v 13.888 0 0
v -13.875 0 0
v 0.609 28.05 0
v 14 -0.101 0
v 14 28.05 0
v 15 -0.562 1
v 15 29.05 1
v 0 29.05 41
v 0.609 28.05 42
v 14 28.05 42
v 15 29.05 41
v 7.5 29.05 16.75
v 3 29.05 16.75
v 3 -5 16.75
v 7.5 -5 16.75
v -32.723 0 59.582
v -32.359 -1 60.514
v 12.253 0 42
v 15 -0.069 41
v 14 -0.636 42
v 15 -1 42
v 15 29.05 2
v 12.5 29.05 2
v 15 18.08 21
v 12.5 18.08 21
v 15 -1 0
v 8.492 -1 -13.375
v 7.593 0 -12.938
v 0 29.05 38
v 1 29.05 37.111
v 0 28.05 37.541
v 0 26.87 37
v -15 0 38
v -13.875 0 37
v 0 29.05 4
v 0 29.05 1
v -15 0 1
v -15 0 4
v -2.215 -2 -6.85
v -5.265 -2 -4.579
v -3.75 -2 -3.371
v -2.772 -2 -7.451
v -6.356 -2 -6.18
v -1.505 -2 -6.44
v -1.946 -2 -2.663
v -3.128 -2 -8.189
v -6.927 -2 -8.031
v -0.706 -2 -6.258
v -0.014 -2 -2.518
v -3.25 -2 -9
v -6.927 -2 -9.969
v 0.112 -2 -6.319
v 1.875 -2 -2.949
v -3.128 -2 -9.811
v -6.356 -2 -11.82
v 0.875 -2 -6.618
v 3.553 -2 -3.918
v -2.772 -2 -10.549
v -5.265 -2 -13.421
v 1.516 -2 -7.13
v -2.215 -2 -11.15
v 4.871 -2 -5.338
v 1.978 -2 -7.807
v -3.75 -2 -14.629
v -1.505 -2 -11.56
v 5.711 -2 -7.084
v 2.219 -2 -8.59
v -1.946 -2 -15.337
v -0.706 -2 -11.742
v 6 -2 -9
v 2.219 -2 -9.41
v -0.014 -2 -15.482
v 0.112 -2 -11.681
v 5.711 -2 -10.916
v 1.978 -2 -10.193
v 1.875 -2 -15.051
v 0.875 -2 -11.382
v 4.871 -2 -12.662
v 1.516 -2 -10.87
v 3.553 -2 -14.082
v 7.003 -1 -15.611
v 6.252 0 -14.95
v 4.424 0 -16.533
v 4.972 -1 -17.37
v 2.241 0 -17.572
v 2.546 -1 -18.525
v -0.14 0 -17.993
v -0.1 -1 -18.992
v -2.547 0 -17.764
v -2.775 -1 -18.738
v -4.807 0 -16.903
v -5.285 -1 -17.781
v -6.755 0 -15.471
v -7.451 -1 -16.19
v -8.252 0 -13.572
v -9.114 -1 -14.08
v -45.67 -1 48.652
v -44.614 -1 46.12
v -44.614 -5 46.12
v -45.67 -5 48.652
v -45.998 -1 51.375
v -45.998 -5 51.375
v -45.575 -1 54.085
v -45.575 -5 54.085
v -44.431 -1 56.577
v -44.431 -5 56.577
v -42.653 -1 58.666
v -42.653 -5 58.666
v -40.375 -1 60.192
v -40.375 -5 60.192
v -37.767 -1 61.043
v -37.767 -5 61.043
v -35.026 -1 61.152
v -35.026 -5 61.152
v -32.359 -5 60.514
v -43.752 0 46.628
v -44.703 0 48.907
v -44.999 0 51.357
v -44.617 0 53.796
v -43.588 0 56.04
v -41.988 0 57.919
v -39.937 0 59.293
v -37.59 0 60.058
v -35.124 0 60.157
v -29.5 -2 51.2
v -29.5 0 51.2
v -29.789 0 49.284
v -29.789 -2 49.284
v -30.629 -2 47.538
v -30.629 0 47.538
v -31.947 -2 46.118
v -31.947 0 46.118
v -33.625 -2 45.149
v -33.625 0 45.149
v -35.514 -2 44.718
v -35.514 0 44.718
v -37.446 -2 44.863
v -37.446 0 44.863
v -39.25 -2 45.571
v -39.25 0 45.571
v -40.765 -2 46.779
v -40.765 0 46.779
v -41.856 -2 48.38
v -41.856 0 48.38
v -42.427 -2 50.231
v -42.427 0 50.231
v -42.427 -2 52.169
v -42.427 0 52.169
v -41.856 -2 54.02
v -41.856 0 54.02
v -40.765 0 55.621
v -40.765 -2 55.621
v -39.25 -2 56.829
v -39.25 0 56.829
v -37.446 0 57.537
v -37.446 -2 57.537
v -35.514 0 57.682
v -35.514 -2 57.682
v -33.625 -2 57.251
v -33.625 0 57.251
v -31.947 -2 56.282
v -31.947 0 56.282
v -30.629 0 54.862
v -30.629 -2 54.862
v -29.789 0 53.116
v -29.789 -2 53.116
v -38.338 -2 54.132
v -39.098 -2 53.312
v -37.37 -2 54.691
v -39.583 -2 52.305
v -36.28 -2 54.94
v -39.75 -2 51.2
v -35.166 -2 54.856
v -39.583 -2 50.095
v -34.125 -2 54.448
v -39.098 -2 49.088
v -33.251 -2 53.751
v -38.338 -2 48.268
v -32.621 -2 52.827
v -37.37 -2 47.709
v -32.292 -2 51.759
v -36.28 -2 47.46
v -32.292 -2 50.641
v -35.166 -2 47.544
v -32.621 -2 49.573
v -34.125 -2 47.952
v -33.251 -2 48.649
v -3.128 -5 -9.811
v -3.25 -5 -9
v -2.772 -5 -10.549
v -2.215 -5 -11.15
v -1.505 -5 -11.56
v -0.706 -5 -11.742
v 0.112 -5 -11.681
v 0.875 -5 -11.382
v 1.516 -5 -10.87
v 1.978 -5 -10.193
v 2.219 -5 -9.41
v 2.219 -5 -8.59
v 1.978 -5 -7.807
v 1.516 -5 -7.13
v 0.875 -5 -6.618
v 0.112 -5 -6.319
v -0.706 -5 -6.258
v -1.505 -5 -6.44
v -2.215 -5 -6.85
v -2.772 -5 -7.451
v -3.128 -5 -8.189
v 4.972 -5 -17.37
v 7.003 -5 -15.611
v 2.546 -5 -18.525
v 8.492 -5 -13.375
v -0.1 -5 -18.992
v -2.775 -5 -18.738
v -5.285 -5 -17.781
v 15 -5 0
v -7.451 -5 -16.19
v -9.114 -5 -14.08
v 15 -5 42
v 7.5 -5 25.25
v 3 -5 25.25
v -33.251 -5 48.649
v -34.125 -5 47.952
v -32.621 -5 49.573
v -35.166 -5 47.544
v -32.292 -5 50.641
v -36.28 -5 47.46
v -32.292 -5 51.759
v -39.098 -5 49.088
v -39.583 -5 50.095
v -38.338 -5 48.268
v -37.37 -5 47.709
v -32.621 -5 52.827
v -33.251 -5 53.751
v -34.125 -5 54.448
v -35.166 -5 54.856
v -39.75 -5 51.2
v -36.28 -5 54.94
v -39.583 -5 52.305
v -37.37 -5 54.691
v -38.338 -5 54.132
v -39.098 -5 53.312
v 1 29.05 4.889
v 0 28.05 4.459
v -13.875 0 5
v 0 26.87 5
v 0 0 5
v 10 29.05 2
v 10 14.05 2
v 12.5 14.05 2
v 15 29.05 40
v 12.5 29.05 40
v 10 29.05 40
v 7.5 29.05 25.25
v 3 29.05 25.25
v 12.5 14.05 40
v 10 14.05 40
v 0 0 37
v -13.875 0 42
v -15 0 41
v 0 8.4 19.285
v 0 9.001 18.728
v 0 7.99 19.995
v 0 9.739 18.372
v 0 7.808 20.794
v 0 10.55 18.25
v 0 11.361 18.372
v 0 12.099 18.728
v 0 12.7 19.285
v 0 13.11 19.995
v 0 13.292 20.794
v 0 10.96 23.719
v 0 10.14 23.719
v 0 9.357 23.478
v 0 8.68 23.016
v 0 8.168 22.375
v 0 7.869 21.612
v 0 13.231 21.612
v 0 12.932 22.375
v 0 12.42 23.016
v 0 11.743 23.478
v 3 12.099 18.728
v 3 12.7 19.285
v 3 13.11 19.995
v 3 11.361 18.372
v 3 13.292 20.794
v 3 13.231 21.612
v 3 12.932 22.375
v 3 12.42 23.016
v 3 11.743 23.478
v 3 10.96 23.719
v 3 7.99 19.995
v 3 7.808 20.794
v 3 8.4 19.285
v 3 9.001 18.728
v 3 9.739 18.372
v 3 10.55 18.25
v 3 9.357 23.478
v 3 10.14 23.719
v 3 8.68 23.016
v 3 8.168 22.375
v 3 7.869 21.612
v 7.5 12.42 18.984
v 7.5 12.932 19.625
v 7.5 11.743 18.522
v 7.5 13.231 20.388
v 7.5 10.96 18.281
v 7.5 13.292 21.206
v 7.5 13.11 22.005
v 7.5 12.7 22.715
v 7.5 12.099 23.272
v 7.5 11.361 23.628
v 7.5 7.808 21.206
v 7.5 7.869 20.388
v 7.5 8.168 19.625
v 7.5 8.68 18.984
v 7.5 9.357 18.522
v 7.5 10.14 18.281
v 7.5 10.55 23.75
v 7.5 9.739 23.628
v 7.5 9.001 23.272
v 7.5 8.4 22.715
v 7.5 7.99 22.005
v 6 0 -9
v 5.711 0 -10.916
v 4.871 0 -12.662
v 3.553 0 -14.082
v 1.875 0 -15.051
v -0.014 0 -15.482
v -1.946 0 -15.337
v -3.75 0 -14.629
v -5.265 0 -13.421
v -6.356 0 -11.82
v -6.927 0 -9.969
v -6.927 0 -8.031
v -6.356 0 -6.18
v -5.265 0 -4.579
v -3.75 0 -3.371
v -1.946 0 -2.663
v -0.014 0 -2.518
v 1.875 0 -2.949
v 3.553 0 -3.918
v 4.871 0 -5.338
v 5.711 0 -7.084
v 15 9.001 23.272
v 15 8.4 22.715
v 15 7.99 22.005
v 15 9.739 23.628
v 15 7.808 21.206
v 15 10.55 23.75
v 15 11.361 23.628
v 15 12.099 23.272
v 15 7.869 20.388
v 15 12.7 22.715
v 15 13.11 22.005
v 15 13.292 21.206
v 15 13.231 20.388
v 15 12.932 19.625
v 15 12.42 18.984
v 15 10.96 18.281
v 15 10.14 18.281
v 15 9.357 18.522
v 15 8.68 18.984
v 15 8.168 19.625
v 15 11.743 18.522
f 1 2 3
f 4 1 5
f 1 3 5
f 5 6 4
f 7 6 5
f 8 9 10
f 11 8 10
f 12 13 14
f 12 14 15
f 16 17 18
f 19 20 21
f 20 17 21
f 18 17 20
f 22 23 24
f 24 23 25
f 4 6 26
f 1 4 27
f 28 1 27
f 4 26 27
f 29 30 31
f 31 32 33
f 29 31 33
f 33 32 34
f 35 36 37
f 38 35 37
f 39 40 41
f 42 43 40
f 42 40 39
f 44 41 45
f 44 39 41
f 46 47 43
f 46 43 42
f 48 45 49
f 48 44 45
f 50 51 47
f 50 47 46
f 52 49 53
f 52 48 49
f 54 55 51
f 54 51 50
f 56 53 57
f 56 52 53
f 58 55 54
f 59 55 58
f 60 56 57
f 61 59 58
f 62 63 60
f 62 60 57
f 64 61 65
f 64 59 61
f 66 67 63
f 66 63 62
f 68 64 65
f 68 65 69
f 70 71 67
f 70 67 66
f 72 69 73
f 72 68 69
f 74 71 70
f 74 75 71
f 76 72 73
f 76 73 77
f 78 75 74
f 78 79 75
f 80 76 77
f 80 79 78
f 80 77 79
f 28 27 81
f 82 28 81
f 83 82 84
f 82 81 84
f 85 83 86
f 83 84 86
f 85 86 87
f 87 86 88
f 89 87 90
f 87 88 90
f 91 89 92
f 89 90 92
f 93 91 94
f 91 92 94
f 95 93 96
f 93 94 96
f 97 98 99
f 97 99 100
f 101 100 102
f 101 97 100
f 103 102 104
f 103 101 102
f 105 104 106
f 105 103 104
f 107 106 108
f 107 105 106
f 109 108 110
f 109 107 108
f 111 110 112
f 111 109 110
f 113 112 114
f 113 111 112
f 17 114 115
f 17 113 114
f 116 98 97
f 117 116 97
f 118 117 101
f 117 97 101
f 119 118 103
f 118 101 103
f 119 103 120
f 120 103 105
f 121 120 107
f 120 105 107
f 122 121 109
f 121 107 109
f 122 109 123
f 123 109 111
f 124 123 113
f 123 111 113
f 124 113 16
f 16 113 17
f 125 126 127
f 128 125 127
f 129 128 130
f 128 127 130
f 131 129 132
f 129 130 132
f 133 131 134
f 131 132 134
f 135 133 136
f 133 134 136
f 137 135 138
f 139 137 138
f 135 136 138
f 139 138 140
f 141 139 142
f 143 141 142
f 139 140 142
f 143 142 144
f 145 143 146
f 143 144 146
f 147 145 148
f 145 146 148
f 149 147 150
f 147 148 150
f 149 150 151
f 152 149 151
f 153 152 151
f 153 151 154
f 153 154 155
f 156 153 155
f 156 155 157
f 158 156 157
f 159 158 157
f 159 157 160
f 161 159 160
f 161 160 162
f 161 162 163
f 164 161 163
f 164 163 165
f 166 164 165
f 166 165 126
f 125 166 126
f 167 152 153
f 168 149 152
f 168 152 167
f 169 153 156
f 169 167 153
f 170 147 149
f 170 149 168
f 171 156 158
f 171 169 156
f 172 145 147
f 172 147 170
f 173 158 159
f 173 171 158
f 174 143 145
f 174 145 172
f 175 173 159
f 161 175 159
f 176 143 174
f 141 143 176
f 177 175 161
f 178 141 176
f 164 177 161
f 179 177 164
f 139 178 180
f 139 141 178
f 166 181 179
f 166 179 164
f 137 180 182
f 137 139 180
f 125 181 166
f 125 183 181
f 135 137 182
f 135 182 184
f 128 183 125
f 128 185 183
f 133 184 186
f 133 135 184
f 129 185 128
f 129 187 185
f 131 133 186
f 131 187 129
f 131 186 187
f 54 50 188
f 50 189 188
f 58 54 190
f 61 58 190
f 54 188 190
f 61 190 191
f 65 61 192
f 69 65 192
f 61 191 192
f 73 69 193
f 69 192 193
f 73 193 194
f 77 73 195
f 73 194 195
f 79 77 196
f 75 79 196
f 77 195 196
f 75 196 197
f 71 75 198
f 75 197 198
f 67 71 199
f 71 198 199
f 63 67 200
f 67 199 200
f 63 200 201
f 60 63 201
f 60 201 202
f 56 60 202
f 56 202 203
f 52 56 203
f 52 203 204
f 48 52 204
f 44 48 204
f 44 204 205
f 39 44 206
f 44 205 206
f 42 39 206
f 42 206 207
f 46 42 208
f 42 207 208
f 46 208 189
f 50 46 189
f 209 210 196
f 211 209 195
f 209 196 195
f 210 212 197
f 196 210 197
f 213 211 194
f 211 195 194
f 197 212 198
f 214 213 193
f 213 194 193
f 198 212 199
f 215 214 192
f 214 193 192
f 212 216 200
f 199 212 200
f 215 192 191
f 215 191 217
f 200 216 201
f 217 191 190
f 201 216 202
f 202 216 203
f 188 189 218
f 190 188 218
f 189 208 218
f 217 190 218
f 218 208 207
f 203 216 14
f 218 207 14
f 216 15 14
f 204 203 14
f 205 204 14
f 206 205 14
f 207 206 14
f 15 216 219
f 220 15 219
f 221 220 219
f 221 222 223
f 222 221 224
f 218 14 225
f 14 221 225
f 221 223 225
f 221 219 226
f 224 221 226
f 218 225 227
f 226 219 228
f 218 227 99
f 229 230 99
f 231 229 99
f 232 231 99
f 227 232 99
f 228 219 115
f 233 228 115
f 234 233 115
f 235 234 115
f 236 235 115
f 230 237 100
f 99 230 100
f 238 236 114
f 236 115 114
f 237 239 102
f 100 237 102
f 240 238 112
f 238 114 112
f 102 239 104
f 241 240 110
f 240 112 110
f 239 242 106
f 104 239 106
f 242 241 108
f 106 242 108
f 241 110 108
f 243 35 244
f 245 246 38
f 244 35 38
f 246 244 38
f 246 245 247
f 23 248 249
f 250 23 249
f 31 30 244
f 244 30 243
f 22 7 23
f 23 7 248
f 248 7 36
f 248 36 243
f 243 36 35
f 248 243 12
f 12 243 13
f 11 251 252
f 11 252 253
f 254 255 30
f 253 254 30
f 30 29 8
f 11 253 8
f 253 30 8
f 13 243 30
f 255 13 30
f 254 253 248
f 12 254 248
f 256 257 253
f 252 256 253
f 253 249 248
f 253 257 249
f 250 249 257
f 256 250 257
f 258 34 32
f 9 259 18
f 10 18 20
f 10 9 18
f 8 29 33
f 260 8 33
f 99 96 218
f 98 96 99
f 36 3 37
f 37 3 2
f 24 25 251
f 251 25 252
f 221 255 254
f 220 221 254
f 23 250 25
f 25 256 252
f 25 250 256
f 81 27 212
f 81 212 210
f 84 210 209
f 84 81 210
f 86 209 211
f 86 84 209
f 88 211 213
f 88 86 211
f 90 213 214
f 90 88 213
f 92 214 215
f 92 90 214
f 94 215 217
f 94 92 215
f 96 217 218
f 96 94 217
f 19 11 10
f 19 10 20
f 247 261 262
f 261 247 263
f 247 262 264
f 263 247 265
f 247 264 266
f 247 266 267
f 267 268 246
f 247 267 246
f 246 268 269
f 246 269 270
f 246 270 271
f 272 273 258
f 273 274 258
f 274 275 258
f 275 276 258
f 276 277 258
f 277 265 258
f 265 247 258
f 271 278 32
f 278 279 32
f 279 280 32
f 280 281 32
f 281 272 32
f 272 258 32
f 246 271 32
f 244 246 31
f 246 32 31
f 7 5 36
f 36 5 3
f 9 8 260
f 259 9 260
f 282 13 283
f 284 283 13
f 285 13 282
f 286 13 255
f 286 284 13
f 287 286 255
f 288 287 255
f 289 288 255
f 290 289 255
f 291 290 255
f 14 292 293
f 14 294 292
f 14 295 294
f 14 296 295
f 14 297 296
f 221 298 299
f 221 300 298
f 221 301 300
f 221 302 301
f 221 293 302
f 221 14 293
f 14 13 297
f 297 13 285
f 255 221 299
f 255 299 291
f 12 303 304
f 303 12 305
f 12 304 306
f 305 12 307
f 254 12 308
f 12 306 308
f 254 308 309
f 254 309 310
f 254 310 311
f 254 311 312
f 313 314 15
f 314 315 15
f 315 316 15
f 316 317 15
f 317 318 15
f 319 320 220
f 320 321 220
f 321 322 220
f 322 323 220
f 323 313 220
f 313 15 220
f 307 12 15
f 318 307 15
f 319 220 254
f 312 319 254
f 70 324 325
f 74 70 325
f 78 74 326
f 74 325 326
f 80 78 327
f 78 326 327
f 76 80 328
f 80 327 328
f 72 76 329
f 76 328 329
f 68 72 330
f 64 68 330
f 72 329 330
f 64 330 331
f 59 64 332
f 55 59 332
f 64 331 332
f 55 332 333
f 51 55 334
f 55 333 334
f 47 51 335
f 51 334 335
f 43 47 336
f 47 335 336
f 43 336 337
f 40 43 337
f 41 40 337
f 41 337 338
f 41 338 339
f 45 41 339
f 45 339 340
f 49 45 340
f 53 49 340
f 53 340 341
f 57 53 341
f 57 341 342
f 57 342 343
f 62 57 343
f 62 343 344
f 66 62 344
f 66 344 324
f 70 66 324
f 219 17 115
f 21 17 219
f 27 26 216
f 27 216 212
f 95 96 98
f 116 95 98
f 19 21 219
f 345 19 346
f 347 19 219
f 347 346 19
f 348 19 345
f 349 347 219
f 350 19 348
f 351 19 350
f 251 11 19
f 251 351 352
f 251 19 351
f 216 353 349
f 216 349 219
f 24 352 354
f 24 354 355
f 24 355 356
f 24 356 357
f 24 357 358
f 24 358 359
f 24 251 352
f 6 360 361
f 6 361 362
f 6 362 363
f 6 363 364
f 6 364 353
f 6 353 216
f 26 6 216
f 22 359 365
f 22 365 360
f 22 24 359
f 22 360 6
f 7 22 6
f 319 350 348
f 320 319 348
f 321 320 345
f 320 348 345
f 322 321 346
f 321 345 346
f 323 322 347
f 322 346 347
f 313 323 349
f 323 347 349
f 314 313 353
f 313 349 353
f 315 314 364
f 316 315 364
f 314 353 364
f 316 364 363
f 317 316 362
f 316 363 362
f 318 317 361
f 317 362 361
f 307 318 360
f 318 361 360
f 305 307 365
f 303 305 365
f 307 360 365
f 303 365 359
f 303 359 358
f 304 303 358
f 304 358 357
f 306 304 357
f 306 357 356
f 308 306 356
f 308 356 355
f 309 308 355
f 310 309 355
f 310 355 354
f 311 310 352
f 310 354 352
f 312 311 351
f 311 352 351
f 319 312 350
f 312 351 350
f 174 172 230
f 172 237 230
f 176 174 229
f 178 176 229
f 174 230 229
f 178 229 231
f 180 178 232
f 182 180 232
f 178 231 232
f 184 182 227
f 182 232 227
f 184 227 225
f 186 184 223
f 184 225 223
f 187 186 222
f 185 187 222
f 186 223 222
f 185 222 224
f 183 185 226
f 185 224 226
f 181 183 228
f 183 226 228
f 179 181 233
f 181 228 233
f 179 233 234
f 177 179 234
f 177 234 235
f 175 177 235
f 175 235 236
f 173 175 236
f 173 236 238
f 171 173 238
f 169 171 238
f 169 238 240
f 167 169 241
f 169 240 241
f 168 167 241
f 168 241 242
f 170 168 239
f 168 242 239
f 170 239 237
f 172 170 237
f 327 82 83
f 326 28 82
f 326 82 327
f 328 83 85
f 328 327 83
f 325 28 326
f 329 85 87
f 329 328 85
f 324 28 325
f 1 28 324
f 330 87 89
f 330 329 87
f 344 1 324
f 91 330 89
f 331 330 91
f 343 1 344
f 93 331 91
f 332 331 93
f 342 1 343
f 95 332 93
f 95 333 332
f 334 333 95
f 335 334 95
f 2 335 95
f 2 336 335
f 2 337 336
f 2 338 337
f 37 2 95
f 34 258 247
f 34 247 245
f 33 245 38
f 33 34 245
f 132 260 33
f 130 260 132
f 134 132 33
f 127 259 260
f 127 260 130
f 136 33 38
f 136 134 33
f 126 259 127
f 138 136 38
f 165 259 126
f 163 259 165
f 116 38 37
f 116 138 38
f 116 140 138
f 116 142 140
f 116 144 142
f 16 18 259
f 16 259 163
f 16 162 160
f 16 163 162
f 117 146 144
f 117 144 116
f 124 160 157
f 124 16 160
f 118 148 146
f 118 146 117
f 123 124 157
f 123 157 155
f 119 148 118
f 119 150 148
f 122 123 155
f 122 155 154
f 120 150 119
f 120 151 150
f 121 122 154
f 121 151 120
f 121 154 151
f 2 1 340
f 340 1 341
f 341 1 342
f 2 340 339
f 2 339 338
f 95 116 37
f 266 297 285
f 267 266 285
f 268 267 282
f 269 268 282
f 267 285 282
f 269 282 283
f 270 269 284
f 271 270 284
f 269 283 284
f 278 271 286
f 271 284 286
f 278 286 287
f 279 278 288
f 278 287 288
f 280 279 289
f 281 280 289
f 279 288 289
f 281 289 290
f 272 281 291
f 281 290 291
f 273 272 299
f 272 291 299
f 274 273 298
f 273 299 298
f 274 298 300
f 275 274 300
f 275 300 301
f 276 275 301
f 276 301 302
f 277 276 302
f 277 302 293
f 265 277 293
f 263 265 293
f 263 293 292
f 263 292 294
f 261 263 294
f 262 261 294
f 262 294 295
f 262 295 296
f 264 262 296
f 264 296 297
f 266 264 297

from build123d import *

# Parameters (mm, degrees)
CUT_EXTRUDE1_OUTLINE_W                  = 29.05
CUT_EXTRUDE1_OUTLINE_H                  = 42
CUT_EXTRUDE1_DEPTH                      = 10
CUT_EXTRUDE1_START                      = 10
CUT_EXTRUDE1_2_DEPTH                    = 5
CUT_EXTRUDE1_START_2                    = 12.5
CUT_EXTRUDE1_3_DEPTH                    = 2.5
CUT_EXTRUDE1_4_DEPTH                    = 5
CUT_EXTRUDE1_START_3                    = 37
CUT_EXTRUDE1_5_DEPTH                    = 5
BOSS_EXTRUDE1_DEPTH                     = 5
SKETCH3_W                               = 4.5
SKETCH3_H                               = 8.5
CUT_EXTRUDE2_DEPTH                      = 84.790467835
CBORE_FOR_M5_HEX_HEAD_BOLT1_D           = 5.5
CBORE_FOR_M5_HEX_HEAD_BOLT1_CBORE_D     = 13
CBORE_FOR_M5_HEX_HEAD_BOLT1_CBORE_DEPTH = 2
CBORE_FOR_M6_5_SHSS1_D                  = 7.5
CBORE_FOR_M6_5_SHSS1_CBORE_D            = 13
CBORE_FOR_M6_5_SHSS1_CBORE_DEPTH        = 2
SKETCH8_W                               = 2.75
SKETCH8_H                               = 7.5
F_5_5_5_5_DIAMETER_HOLE2_D              = 5.5
F_5_5_5_5_DIAMETER_HOLE2_DEPTH          = 15
CHAMFER2_SIZE                           = 1
CHAMFER3_SIZE                           = 1
CHAMFER4_SIZE                           = 1


with BuildPart() as part:
    # Cut-Extrude1: read off the stored shape, not the designer's step
    # Cut-Extrude1 outline → Cut-Extrude1 (new body)
    with BuildSketch(Plane.YZ):
        with Locations((14.525, 21)):
            Rectangle(CUT_EXTRUDE1_OUTLINE_W, CUT_EXTRUDE1_OUTLINE_H)
    extrude(amount=CUT_EXTRUDE1_DEPTH)

    # Cut-Extrude1 2 outline → Cut-Extrude1 2 (add)
    with BuildSketch(Plane.YZ.offset(CUT_EXTRUDE1_START)):
        Polygon((29.05, 2), (14.05, 2), (14.05, 40), (29.05, 40), (29.05, 42), (0, 42), (0, 0), (29.05, 0), align=None)
    extrude(amount=CUT_EXTRUDE1_2_DEPTH)

    # Cut-Extrude1 3 outline → Cut-Extrude1 3 (add)
    with BuildSketch(Plane.YZ.offset(CUT_EXTRUDE1_START_2)):
        Polygon((14.05, 2), (29.05, 2), (18.080344885, 21), (29.05, 40), (14.05, 40), align=None)
    extrude(amount=CUT_EXTRUDE1_3_DEPTH)

    # Cut-Extrude1 4 outline → Cut-Extrude1 4 (add)
    with BuildSketch(Plane.XY):
        Polygon((0, 29.05), (-15, 0), (0, 0), align=None)
    extrude(amount=CUT_EXTRUDE1_4_DEPTH)

    # Cut-Extrude1 5 outline → Cut-Extrude1 5 (add)
    with BuildSketch(Plane.XY.offset(CUT_EXTRUDE1_START_3)):
        Polygon((0, 29.05), (-15, 0), (0, 0), align=None)
    extrude(amount=CUT_EXTRUDE1_5_DEPTH)

    # Sketch2 → Boss-Extrude1 (add)
    with BuildSketch(Plane.XZ):
        with BuildLine():
            Line((-9.113819566, -14.079577983), (-44.613819566, 46.120422017))
            ThreePointArc((-44.613819566, 46.120422017), (-43.61404549, 57.68277034), (-32.359107934, 60.513640801))
            Line((-32.359107934, 60.513640801), (15, 42))
            Line((15, 42), (15, 0))
            Line((15, 0), (8.492070756, -13.375232968))
            ThreePointArc((8.492070756, -13.375232968), (-0.100257626, -18.992007107), (-9.113819566, -14.079577983))
        make_face()
    extrude(amount=BOSS_EXTRUDE1_DEPTH)

    # Sketch3 → Cut-Extrude2 (cut, through all)
    with BuildSketch(Plane.XZ.offset(5)):
        with Locations((5.25, 21)):
            Rectangle(SKETCH3_W, SKETCH3_H)
    extrude(amount=-CUT_EXTRUDE2_DEPTH, mode=Mode.SUBTRACT)

    # CBORE for M5 Hex Head Bolt1 (through all)
    with Locations(Plane(origin=(0, 0, 0), x_dir=(1, 0, 0), z_dir=(0, 1, 0))):
        with Locations((-0.5, 9)):
            CounterBoreHole(CBORE_FOR_M5_HEX_HEAD_BOLT1_D / 2, CBORE_FOR_M5_HEX_HEAD_BOLT1_CBORE_D / 2, CBORE_FOR_M5_HEX_HEAD_BOLT1_CBORE_DEPTH)

    # CBORE for M6.5 SHSS1 (through all)
    with Locations(Plane(origin=(0, 0, 0), x_dir=(1, 0, 0), z_dir=(0, 1, 0))):
        with Locations((-36, -51.2)):
            CounterBoreHole(CBORE_FOR_M6_5_SHSS1_D / 2, CBORE_FOR_M6_5_SHSS1_CBORE_D / 2, CBORE_FOR_M6_5_SHSS1_CBORE_DEPTH)

    # Sketch8 → Ø5.5 (5.5) Diameter Hole1 (revolve, cut)
    with BuildSketch(Plane(origin=(7.5, 10.55, 21), x_dir=(0, 0, 1), z_dir=(0, 1, 0))):
        with Locations((1.375, 3.75)):
            Rectangle(SKETCH8_W, SKETCH8_H)
    revolve(axis=Axis((1.15, 10.55, 21), (1, 0, 0)), mode=Mode.SUBTRACT)

    # Ø5.5 (5.5) Diameter Hole2
    with Locations(Plane.ZY):
        with Locations((21, 10.55)):
            Hole(F_5_5_5_5_DIAMETER_HOLE2_D / 2, depth=F_5_5_5_5_DIAMETER_HOLE2_DEPTH)

    # Chamfer2
    chamfer2_edges = [part.edges().sort_by_distance(p)[0] for p in [
        (-7.5, 14.525, 42),
        (7.5, 29.05, 42),
        (-7.5, 14.525, 5),
        (7.5, 29.05, 0),
        (-7.5, 14.525, 0),
        (-7.5, 14.525, 37),
        (-0.100257626, 0, -18.992007107),
        (11.746035378, 0, -6.687616484),
        (-8.679553967, 0, 51.2568204),
        (-43.61404549, 0, 57.68277034),
        (-26.863819566, 0, 16.020422017),
    ]]
    chamfer(chamfer2_edges, length=CHAMFER2_SIZE)

    # Chamfer3
    chamfer3_edges = [part.edges().sort_by_distance(p)[0] for p in [
        (0, 29.05, 21),
    ]]
    chamfer(chamfer3_edges, length=CHAMFER3_SIZE)

    # Chamfer4
    chamfer4_edges = [part.edges().sort_by_distance(p)[0] for p in [
        (15, 13.525, 0),
        (15, 13.525, 42),
    ]]
    chamfer(chamfer4_edges, length=CHAMFER4_SIZE)


solid = part.part
